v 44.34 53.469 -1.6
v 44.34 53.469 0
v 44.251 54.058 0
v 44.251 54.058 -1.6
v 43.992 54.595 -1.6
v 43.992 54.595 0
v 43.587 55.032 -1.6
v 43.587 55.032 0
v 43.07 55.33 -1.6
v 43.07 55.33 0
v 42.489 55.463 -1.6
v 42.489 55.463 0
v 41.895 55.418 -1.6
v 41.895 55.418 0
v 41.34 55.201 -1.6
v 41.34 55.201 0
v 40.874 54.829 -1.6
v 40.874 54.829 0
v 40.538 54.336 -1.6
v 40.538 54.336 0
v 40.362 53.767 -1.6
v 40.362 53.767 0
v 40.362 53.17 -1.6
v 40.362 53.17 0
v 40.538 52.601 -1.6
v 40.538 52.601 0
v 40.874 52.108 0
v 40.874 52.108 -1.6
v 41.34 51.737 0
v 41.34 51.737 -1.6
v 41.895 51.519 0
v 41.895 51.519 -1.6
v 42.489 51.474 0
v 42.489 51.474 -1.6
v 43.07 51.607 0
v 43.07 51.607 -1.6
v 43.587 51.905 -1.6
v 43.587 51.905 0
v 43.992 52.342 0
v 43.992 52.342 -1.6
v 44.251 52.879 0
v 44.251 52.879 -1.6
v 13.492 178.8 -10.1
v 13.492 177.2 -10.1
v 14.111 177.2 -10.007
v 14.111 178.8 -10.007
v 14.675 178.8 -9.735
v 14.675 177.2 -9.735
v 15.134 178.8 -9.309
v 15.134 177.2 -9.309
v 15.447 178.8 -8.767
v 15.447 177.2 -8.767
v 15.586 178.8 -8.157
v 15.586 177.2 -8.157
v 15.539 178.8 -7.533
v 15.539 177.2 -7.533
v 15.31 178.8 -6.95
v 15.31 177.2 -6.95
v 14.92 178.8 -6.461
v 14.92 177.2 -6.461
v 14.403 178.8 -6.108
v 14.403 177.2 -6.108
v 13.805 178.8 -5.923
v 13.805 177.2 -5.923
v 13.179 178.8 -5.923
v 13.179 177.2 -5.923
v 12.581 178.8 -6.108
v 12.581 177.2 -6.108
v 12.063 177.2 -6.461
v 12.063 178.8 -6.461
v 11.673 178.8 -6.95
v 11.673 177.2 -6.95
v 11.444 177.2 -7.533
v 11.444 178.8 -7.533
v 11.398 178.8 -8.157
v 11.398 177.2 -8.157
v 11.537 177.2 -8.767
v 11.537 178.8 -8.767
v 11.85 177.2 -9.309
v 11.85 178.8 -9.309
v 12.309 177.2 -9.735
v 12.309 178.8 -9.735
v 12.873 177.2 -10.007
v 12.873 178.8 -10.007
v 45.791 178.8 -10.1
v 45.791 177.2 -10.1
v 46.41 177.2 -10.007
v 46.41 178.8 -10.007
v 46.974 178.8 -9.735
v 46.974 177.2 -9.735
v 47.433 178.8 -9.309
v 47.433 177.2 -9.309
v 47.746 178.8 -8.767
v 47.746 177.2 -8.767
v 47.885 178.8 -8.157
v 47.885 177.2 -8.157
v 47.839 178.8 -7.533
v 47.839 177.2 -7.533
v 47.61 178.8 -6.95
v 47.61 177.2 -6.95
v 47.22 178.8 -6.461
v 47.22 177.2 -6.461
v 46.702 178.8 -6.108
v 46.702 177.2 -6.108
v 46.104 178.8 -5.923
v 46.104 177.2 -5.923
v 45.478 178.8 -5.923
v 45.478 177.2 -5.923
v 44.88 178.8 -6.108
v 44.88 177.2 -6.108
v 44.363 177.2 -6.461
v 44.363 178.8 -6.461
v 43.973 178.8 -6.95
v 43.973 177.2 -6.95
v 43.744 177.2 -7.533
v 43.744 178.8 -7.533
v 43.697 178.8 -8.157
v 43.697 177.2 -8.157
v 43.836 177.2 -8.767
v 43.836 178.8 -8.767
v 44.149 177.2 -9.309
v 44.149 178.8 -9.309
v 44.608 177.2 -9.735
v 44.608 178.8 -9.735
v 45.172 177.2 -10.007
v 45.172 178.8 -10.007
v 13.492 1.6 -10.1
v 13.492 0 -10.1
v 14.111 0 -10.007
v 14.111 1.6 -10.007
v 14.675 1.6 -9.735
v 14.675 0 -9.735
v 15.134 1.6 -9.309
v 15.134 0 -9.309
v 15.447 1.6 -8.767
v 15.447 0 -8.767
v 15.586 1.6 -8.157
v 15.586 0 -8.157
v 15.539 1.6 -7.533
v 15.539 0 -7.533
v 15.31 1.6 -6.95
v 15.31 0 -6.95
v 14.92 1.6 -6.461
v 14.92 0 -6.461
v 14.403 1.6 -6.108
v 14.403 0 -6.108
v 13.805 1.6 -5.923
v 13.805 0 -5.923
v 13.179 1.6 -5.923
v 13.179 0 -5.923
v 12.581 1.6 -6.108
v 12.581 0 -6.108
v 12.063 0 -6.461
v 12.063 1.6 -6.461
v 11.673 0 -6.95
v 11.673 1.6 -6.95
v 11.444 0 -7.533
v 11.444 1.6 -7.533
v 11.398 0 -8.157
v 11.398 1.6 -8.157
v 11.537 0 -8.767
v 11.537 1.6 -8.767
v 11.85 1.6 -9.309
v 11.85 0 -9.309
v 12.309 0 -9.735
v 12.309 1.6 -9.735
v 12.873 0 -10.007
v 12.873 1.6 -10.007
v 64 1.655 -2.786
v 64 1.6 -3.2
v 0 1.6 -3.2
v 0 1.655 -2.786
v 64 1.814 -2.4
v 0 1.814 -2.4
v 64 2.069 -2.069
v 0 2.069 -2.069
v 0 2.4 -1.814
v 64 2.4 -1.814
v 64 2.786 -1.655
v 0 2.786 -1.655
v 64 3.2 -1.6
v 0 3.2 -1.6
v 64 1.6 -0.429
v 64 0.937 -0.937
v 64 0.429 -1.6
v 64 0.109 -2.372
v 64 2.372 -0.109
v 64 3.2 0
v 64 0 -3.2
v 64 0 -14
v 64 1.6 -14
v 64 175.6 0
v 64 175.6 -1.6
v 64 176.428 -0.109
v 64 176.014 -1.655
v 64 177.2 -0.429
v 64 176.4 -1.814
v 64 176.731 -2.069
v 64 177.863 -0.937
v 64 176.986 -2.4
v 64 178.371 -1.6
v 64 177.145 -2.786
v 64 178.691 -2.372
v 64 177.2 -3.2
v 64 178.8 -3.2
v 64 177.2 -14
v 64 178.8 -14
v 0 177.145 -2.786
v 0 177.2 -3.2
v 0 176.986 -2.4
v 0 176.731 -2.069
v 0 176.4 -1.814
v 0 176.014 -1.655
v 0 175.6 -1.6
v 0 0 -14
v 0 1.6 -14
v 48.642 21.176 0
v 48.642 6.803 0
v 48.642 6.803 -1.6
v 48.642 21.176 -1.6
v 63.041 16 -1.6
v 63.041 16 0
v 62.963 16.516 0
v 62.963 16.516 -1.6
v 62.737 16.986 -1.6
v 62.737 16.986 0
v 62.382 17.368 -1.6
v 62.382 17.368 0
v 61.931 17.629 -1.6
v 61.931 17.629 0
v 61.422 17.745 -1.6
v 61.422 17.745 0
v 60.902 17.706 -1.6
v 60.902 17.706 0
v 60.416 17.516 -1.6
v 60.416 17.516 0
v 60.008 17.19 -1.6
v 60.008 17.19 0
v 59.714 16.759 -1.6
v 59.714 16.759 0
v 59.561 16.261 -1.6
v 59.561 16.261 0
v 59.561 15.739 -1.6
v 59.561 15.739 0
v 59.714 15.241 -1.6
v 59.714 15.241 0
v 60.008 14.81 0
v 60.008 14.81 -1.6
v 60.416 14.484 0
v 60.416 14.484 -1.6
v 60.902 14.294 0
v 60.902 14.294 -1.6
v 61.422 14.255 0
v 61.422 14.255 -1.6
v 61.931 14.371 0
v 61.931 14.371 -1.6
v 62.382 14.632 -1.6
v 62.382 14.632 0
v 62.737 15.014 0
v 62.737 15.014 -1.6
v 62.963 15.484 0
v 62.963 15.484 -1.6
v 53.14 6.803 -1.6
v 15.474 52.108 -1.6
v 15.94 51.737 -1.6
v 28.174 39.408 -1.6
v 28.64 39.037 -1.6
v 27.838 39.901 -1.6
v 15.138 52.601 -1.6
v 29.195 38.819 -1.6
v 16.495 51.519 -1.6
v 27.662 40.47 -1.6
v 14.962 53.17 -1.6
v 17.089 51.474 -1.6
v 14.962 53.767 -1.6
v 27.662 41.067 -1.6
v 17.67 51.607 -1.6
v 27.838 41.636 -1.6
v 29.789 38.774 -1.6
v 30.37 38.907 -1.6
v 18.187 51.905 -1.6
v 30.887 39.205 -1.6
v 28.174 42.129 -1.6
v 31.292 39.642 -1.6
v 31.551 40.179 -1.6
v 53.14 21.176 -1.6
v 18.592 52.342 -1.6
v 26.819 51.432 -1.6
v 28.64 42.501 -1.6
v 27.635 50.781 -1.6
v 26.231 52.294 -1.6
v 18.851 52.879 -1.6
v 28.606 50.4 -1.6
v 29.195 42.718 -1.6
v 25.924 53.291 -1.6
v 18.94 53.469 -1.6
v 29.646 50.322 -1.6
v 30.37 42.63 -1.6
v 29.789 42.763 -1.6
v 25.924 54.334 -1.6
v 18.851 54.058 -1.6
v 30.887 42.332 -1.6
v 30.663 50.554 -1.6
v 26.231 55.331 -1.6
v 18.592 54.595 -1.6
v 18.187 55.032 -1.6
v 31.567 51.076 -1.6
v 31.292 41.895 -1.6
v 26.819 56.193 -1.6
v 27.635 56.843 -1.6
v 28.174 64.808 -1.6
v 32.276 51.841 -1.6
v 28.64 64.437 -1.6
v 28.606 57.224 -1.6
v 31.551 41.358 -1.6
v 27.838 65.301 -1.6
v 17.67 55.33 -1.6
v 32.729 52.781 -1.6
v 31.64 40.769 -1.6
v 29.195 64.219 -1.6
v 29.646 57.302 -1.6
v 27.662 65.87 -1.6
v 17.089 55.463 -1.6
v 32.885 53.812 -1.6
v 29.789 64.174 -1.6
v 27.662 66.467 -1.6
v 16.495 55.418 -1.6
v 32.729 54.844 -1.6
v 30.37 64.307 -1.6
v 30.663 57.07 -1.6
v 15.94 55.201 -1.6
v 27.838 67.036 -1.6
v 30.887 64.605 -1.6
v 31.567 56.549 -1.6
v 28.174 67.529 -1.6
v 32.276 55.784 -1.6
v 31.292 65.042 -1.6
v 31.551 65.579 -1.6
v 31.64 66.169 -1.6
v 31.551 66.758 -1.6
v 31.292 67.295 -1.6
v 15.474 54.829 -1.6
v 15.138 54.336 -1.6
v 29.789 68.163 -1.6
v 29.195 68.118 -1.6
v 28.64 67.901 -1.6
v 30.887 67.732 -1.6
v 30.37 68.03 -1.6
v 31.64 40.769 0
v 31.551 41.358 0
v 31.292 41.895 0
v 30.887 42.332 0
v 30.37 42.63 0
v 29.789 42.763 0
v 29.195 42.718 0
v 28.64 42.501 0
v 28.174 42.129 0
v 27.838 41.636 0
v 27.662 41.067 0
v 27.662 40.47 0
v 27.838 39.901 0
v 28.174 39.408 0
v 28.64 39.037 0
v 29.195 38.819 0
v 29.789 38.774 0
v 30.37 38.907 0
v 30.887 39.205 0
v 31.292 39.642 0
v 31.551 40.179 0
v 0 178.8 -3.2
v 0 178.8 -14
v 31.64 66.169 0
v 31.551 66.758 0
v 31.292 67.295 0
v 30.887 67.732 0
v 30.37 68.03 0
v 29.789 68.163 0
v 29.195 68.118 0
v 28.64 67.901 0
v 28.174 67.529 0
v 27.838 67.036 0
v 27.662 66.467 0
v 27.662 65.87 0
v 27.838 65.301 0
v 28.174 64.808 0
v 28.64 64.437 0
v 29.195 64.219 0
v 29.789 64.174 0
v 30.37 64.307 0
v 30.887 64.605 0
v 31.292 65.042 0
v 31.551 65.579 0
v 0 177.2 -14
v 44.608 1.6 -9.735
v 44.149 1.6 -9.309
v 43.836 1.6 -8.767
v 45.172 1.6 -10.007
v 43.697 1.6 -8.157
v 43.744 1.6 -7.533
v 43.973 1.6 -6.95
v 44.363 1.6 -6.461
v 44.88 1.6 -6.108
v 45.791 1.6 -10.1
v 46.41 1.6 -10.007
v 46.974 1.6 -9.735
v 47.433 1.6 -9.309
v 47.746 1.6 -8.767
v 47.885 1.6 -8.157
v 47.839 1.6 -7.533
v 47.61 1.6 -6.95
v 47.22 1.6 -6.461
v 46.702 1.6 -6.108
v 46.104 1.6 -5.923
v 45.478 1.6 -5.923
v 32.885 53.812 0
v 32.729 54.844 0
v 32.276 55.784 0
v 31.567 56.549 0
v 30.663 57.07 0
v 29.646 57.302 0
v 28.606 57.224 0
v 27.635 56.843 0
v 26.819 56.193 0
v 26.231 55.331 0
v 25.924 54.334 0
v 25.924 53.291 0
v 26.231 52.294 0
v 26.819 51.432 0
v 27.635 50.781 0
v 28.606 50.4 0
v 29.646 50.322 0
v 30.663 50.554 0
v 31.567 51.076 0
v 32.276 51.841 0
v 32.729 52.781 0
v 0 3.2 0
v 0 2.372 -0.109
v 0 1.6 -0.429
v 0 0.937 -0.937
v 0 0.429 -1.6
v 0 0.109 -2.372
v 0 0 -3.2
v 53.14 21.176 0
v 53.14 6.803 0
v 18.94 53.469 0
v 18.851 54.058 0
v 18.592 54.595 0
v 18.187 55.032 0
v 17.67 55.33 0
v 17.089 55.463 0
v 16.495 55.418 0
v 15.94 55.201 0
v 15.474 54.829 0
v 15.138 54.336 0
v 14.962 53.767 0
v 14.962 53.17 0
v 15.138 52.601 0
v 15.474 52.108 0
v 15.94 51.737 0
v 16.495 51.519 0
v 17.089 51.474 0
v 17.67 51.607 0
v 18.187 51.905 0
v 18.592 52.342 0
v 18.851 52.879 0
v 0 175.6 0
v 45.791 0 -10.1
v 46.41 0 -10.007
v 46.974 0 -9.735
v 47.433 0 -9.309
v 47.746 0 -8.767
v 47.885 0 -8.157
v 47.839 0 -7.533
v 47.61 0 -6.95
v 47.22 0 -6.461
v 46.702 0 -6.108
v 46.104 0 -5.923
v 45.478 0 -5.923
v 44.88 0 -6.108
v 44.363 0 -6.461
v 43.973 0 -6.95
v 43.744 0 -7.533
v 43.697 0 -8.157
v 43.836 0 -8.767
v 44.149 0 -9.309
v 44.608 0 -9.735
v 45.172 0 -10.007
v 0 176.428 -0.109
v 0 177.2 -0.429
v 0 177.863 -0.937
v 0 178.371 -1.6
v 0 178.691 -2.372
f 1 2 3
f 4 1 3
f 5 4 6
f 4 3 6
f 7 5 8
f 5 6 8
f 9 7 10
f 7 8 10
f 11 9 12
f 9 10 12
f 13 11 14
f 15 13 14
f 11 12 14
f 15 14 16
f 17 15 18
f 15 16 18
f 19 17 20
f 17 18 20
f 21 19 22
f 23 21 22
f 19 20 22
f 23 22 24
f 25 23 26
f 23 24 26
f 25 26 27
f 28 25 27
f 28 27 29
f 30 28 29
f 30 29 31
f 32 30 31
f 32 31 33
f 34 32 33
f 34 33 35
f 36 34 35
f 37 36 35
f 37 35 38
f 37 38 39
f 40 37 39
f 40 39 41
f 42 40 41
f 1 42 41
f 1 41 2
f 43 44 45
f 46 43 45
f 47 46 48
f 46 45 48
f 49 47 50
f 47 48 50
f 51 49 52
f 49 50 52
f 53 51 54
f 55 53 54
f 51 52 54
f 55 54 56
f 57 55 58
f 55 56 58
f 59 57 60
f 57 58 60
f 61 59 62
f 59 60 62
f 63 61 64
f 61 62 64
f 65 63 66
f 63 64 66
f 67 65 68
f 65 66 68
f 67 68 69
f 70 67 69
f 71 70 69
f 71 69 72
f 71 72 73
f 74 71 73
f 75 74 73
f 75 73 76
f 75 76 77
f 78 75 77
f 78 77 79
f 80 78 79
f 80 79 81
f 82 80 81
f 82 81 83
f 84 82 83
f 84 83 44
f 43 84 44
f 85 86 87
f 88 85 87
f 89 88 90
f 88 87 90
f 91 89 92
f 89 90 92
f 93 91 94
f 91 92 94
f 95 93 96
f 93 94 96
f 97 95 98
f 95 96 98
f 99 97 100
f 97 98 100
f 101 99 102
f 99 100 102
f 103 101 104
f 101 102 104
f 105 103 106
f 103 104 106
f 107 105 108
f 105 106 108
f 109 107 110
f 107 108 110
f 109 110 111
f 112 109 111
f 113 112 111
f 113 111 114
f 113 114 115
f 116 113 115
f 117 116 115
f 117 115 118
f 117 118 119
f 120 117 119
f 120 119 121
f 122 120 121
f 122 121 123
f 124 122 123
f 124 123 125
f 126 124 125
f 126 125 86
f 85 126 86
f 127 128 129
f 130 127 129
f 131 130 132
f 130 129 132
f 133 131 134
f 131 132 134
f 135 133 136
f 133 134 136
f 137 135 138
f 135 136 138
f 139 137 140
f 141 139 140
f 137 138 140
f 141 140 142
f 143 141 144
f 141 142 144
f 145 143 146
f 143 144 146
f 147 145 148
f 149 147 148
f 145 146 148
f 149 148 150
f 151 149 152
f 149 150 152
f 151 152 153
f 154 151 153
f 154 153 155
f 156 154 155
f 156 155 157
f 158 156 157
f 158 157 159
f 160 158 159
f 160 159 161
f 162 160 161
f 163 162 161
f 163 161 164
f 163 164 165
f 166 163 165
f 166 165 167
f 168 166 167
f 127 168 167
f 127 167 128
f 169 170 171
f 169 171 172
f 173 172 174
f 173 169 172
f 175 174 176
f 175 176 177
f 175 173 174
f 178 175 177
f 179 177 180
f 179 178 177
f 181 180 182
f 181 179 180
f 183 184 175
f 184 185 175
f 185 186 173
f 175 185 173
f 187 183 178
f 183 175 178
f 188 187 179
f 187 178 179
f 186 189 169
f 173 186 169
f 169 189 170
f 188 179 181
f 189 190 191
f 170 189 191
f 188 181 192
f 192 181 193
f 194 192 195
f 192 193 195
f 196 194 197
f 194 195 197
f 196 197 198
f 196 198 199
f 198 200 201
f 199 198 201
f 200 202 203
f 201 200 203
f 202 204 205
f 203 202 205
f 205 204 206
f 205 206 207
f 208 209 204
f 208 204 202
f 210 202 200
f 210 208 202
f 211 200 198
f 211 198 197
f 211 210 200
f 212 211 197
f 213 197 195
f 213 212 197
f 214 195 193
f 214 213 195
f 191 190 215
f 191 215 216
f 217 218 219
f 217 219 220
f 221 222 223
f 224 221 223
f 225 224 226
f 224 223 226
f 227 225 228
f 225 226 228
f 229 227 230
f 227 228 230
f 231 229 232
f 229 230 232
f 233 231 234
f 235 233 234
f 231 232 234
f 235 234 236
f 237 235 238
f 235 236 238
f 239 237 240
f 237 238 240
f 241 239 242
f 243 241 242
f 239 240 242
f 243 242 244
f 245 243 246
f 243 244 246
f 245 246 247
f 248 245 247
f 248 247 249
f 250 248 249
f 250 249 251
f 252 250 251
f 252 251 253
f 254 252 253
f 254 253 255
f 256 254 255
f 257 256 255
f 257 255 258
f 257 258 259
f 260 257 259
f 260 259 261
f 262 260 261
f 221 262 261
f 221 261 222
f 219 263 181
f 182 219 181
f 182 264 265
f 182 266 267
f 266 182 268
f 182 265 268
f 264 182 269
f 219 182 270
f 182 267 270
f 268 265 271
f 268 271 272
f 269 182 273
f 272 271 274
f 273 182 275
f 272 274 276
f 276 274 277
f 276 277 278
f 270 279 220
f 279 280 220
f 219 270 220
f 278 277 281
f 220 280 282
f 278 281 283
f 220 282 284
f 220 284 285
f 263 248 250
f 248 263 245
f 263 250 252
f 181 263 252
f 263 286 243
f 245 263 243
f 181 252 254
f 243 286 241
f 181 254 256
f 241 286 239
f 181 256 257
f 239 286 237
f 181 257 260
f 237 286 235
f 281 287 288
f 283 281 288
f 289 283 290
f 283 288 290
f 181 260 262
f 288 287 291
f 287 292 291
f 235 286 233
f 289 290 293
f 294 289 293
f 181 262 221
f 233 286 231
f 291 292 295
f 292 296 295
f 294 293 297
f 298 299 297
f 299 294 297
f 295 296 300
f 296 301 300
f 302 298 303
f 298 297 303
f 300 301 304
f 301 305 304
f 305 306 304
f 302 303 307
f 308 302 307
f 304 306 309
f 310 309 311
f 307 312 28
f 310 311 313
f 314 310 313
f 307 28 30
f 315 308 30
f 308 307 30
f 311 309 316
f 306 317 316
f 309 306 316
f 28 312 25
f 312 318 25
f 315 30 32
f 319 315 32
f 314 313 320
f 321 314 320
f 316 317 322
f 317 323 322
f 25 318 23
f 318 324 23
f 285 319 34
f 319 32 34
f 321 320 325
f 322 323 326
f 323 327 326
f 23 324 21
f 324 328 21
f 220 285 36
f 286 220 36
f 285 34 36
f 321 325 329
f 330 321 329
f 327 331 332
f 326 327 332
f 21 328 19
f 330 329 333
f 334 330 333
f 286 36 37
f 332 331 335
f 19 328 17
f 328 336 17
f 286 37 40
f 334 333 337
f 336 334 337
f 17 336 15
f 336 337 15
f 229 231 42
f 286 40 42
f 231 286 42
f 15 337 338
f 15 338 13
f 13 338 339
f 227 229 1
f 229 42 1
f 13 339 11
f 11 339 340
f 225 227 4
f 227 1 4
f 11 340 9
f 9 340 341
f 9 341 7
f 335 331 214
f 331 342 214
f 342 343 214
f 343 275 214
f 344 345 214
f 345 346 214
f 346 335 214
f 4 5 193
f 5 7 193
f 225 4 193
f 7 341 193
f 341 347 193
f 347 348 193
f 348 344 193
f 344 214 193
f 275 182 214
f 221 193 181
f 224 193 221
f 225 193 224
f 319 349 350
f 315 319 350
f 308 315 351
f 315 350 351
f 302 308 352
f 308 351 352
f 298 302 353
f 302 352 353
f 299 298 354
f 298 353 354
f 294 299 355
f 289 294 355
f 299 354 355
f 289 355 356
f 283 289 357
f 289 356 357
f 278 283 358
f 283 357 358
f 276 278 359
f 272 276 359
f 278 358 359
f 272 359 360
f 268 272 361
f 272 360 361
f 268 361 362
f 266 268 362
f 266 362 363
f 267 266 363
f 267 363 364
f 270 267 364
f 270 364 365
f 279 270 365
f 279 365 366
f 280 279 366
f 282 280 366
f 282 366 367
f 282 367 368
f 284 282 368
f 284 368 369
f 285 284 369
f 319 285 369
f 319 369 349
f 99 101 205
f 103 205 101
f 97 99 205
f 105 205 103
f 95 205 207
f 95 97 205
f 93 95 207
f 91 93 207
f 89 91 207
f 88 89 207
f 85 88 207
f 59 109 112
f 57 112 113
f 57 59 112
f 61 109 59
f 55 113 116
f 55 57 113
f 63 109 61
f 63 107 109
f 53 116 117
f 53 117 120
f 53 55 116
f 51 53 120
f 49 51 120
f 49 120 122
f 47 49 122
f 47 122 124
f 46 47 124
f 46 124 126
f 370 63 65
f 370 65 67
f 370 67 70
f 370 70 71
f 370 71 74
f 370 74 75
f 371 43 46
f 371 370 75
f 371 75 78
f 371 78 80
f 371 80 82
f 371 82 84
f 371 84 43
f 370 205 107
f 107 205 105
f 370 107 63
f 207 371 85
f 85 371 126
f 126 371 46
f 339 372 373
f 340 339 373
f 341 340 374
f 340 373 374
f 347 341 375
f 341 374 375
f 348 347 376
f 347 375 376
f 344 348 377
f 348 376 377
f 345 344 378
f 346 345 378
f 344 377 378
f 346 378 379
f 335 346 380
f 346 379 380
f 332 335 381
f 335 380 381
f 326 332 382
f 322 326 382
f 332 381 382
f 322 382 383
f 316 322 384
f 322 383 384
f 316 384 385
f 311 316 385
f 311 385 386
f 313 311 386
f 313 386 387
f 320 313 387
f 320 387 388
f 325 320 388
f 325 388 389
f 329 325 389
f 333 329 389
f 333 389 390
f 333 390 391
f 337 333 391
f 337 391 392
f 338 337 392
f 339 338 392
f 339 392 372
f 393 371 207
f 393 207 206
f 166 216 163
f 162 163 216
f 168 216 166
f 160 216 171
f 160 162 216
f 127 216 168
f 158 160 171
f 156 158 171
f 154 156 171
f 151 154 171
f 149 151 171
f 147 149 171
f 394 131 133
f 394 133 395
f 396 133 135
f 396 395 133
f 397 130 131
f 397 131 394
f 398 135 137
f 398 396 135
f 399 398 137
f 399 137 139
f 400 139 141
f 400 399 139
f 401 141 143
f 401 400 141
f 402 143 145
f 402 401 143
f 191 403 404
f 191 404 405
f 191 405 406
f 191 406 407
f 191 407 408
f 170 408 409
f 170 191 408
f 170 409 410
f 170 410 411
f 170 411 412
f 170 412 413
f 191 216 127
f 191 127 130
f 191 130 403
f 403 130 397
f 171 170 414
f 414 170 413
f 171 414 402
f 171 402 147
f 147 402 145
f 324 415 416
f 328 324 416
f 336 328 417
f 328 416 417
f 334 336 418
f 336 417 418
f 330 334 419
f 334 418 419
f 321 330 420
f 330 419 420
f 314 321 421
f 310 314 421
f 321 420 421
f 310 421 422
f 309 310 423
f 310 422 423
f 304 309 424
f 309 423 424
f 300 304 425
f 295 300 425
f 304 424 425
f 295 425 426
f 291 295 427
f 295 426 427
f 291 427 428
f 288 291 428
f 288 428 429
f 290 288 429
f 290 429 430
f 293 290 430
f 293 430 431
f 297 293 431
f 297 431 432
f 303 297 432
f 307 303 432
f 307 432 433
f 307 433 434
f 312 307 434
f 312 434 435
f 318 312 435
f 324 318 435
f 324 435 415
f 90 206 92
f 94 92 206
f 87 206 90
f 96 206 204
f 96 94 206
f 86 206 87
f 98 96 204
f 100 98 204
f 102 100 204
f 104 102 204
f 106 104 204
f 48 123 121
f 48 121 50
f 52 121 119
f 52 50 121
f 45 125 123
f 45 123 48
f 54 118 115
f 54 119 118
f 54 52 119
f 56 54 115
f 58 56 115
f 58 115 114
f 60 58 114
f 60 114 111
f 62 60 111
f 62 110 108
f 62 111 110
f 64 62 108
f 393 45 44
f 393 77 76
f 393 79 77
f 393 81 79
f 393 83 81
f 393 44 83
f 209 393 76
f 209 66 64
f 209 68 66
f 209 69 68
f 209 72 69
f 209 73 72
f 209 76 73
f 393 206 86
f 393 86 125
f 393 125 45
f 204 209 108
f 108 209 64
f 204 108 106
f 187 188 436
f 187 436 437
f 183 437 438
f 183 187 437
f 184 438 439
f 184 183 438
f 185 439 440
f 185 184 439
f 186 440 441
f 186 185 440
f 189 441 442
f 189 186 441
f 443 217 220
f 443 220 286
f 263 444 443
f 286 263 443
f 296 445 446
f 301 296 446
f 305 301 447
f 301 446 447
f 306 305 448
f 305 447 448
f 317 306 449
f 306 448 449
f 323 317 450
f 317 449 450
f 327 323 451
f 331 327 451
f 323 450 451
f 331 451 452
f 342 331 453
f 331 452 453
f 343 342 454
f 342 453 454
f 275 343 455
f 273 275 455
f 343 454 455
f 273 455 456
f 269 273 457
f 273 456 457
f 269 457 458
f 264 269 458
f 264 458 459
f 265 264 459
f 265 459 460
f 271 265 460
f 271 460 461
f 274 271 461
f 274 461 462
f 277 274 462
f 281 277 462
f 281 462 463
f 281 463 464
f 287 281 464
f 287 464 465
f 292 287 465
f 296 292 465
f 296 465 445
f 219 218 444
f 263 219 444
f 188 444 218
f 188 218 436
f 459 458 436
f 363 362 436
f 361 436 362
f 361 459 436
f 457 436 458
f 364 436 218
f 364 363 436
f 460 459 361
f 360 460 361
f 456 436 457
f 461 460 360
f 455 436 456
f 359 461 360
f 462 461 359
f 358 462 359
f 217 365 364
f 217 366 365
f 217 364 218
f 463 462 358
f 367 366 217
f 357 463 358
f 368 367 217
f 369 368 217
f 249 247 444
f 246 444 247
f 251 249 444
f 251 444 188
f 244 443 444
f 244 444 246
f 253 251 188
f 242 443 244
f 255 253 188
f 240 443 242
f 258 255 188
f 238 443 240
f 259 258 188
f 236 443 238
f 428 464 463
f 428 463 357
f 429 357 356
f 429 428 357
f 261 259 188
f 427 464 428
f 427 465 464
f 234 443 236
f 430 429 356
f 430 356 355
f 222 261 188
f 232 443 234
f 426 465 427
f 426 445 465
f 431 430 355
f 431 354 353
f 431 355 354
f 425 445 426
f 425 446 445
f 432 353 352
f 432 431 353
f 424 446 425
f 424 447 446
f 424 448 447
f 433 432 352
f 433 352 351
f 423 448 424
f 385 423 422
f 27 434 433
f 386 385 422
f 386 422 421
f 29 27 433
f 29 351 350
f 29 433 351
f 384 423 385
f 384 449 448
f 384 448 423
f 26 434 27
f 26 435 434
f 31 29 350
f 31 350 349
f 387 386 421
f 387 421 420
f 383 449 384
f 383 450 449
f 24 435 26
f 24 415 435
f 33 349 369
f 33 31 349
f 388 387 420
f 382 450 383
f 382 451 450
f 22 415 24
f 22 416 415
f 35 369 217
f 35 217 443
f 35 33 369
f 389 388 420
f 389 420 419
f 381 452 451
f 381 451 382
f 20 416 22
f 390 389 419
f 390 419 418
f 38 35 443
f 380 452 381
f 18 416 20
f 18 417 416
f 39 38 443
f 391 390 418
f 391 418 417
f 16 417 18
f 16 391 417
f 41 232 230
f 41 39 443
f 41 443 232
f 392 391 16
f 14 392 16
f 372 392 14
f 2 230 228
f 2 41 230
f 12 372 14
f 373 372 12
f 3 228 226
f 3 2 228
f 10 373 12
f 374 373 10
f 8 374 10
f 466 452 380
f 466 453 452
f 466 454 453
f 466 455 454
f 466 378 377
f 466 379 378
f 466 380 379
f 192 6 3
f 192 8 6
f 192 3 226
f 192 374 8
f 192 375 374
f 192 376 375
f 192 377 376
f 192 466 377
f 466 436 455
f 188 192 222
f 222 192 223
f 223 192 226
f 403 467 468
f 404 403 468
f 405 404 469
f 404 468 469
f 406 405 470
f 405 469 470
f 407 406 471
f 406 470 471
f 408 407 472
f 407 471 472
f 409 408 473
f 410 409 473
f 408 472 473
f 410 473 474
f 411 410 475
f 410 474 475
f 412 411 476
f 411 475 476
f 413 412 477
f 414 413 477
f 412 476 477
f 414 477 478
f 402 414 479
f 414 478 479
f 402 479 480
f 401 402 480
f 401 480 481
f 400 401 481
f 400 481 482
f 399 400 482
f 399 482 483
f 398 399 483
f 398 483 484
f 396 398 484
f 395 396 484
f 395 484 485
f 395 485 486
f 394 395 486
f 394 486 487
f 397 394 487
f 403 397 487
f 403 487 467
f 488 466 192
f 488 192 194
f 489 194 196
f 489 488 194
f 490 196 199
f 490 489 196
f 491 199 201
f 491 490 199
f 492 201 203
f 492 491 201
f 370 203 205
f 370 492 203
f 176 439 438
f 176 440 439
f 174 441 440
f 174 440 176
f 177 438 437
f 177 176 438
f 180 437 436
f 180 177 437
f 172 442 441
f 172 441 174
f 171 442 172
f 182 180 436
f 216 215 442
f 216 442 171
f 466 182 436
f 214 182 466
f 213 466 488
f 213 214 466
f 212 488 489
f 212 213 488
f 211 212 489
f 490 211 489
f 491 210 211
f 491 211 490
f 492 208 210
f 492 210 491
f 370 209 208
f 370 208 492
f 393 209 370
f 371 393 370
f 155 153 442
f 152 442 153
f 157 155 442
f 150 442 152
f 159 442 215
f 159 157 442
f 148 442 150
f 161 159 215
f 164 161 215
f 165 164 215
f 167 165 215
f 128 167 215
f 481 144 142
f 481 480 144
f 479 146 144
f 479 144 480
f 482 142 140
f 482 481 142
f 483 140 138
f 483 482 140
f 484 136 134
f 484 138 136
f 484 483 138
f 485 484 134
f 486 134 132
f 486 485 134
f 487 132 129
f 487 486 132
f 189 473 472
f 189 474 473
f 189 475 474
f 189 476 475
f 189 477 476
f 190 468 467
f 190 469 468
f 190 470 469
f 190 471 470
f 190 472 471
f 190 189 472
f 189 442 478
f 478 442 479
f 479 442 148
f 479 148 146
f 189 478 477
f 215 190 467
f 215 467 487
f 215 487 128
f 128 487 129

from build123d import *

# Parameters (mm, degrees)
SKETCH1_W                    = 64
SKETCH1_H                    = 178.8
BASE_FLANGE1_DEPTH           = 1.6
EDGE_FLANGE1_STRIP_W         = 9.6
EDGE_FLANGE1_STRIP_H         = 1.6
EDGE_FLANGE1_STRIP_CUT_DEPTH = 64
EDGE_FLANGE1_DEPTH           = 64
EDGE_FLANGE2_STRIP_W         = 9.6
EDGE_FLANGE2_STRIP_H         = 1.6
EDGE_FLANGE2_STRIP_CUT_DEPTH = 64
EDGE_FLANGE2_DEPTH           = 64
SKETCH12_R                   = 2.1
CUT_EXTRUDE1_DEPTH           = 1000
SKETCH13_R                   = 1.75
SKETCH13_R_2                 = 2
CUT_EXTRUDE2_DEPTH           = 1000
SKETCH14_R                   = 3.5
CUT_EXTRUDE3_DEPTH           = 5
SKETCH15_W                   = 4.498408697
SKETCH15_H                   = 14.372964376
CUT_EXTRUDE4_DEPTH           = 10


# Sheet-metal steps are written as plain solids
with BuildPart() as part:
    # Sketch1 → Base-Flange1 (new body)
    with BuildSketch(Plane.XY):
        with Locations((32, 89.4)):
            Rectangle(SKETCH1_W, SKETCH1_H)
    extrude(amount=-BASE_FLANGE1_DEPTH)

    # Edge-Flange1 strip (across the edge) → Edge-Flange1 strip cut (cut)
    with BuildSketch(Plane(origin=(64, 0, -1.6), x_dir=(0, 1, 0), z_dir=(-1, 0, 0))):
        with Locations((-1.6, -0.8)):
            Rectangle(EDGE_FLANGE1_STRIP_W, EDGE_FLANGE1_STRIP_H)
    extrude(amount=EDGE_FLANGE1_STRIP_CUT_DEPTH, mode=Mode.SUBTRACT)

    # Edge-Flange1 section (across the edge) → Edge-Flange1 (add)
    with BuildSketch(Plane(origin=(64, 0, -1.6), x_dir=(0, 1, 0), z_dir=(-1, 0, 0))):
        with BuildLine():
            Line((0, 1.6), (0, 12.4))
            Line((0, 12.4), (1.6, 12.4))
            Line((1.6, 12.4), (1.6, 1.6))
            ThreePointArc((1.6, 1.6), (2.06862915, 0.46862915), (3.2, 0))
            Line((3.2, 0), (3.2, -1.6))
            ThreePointArc((3.2, -1.6), (0.9372583, -0.6627417), (0, 1.6))
        make_face()
    extrude(amount=EDGE_FLANGE1_DEPTH)

    # Edge-Flange2 strip (across the edge) → Edge-Flange2 strip cut (cut)
    with BuildSketch(Plane(origin=(0, 178.8, -1.6), x_dir=(0, -1, 0), z_dir=(1, 0, 0))):
        with Locations((-1.6, -0.8)):
            Rectangle(EDGE_FLANGE2_STRIP_W, EDGE_FLANGE2_STRIP_H)
    extrude(amount=EDGE_FLANGE2_STRIP_CUT_DEPTH, mode=Mode.SUBTRACT)

    # Edge-Flange2 section (across the edge) → Edge-Flange2 (add)
    with BuildSketch(Plane(origin=(0, 178.8, -1.6), x_dir=(0, -1, 0), z_dir=(1, 0, 0))):
        with BuildLine():
            Line((0, 1.6), (0, 12.4))
            Line((0, 12.4), (1.6, 12.4))
            Line((1.6, 12.4), (1.6, 1.6))
            ThreePointArc((1.6, 1.6), (2.06862915, 0.46862915), (3.2, 0))
            Line((3.2, 0), (3.2, -1.6))
            ThreePointArc((3.2, -1.6), (0.9372583, -0.6627417), (0, 1.6))
        make_face()
    extrude(amount=EDGE_FLANGE2_DEPTH)

    # Sketch12 → Cut-Extrude1 (cut)
    with BuildSketch(Plane.XZ):
        with Locations(Location((45.791182174, -8, 0), (0, 0, 270))):
            Circle(SKETCH12_R)
        with Locations(Location((13.491811911, -8, 0), (0, 0, 270))):
            Circle(SKETCH12_R)
    extrude(amount=-CUT_EXTRUDE1_DEPTH, mode=Mode.SUBTRACT)

    # Sketch13 → Cut-Extrude2 (cut)
    with BuildSketch(Plane.XY):
        with Locations((61.291182174, 16)):
            Circle(SKETCH13_R)
        with Locations((29.639685291, 40.768563608)):
            Circle(SKETCH13_R_2)
        with Locations((42.339685291, 53.468563608)):
            Circle(SKETCH13_R_2)
        with Locations((16.939685291, 53.468563608)):
            Circle(SKETCH13_R_2)
        with Locations((29.639685291, 66.168563608)):
            Circle(SKETCH13_R_2)
    extrude(amount=-CUT_EXTRUDE2_DEPTH, mode=Mode.SUBTRACT)

    # Sketch14 → Cut-Extrude3 (cut)
    with BuildSketch(Plane.XY):
        with Locations((29.384576347, 53.812205541)):
            Circle(SKETCH14_R)
    extrude(amount=-CUT_EXTRUDE3_DEPTH, mode=Mode.SUBTRACT)

    # Sketch15 → Cut-Extrude4 (cut)
    with BuildSketch(Plane.XY):
        with Locations((50.891201279, 13.989760377)):
            Rectangle(SKETCH15_W, SKETCH15_H)
    extrude(amount=-CUT_EXTRUDE4_DEPTH, mode=Mode.SUBTRACT)


solid = part.part
